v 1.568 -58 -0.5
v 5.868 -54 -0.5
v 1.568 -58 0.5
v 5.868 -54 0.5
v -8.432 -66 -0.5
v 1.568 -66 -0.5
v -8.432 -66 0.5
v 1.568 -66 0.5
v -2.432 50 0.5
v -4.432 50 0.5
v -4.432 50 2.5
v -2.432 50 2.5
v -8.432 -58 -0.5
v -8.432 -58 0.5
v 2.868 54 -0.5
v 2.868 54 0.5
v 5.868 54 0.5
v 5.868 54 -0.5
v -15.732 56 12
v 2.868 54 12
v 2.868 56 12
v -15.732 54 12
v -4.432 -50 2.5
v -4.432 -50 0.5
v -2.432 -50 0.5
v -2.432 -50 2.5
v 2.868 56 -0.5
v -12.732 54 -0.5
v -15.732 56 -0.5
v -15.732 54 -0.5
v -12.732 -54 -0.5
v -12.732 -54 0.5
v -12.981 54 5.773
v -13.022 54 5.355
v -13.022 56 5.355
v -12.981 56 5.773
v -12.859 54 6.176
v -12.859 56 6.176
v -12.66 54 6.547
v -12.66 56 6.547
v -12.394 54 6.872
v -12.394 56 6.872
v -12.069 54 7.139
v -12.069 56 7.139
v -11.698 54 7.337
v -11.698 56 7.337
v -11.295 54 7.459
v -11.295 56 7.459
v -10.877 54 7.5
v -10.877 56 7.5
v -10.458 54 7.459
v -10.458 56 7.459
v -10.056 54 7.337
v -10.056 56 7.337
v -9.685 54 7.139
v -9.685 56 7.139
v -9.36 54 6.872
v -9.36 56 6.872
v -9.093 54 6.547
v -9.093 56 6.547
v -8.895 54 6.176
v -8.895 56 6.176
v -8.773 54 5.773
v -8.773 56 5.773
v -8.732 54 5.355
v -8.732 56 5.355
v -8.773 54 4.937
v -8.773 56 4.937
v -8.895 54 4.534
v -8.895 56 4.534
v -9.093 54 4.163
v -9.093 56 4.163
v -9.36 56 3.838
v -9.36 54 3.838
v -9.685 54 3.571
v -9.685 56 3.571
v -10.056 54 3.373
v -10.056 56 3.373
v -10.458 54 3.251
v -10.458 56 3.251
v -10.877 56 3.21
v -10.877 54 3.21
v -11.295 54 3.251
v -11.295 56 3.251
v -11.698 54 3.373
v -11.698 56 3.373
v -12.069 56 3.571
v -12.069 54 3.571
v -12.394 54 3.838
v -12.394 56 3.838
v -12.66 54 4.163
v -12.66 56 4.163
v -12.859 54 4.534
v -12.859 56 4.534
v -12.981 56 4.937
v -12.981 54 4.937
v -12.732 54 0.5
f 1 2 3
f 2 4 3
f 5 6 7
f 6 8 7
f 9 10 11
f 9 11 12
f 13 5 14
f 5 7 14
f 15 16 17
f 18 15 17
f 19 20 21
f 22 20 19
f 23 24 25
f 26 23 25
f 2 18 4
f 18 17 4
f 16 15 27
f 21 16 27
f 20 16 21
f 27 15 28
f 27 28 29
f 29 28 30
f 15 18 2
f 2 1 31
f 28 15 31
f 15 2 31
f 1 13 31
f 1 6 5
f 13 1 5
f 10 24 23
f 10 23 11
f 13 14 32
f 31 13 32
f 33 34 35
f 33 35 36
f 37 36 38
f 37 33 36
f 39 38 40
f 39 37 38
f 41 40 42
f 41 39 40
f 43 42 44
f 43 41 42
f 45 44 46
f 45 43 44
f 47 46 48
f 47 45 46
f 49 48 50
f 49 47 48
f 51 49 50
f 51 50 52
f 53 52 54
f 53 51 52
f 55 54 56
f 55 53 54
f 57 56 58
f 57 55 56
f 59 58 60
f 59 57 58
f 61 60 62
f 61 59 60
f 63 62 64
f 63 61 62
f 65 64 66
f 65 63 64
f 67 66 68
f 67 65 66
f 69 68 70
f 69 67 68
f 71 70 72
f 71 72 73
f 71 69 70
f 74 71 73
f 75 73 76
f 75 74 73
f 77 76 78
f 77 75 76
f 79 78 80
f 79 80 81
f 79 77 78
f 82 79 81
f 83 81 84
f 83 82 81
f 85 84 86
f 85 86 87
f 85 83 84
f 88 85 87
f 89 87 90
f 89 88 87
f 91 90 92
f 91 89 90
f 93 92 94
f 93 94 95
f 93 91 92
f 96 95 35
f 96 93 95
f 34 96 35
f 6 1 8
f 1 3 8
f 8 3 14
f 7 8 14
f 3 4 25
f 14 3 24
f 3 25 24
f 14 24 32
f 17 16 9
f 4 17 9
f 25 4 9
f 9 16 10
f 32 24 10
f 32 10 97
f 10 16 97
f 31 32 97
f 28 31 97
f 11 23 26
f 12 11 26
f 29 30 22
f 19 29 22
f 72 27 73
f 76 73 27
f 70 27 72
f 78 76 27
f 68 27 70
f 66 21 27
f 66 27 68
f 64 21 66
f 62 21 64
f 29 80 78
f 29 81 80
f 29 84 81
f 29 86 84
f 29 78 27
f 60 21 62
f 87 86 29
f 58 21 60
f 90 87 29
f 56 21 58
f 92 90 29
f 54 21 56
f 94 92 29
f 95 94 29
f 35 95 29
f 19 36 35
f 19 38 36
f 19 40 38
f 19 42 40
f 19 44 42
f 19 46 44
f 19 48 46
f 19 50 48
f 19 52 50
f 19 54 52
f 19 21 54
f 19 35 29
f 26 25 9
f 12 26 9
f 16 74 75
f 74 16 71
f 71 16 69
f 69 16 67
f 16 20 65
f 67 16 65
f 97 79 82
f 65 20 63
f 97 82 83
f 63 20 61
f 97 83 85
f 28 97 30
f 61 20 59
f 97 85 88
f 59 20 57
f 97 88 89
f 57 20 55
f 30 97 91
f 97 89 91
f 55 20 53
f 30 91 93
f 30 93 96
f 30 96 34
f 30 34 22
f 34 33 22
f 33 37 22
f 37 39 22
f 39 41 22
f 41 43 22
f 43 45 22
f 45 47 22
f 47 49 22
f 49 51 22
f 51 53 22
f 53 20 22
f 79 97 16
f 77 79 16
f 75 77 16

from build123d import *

# Parameters (mm, degrees)
PAD_DEPTH    = 0.5
SKETCH001_W  = 2
SKETCH001_H  = 100
PAD001_DEPTH = 2
SKETCH002_W  = 18.6
SKETCH002_H  = 12.5
SKETCH002_R  = 2.145
PAD002_DEPTH = 2


with BuildPart() as part:
    # Sketch → Pad (new body, symmetric)
    with BuildSketch(Plane.XY):
        Polygon((-12.731854, 54), (5.868146, 54), (5.868146, -53.999996), (1.568146, -57.999992), (1.568146, -66), (-8.431854, -66), (-8.431854, -57.999992), (-12.731854, -53.999996), align=None)
    extrude(amount=PAD_DEPTH, both=True)

    # Sketch001 (on Face10 of Pad) → Pad001 (join)
    with BuildSketch(Plane.XY.offset(0.5)):
        with Locations((-3.431854, 0)):
            Rectangle(SKETCH001_W, SKETCH001_H)
    extrude(amount=PAD001_DEPTH)

    # Sketch002 (on Face1 of Pad001) → Pad002 (join)
    with BuildSketch(Plane(origin=(0, 54, 0), x_dir=(-1, 0, 0), z_dir=(0, 1, 0))):
        with Locations((6.431854, 5.75)):
            Rectangle(SKETCH002_W, SKETCH002_H)
        with Locations((10.876855, 5.355)):
            Circle(SKETCH002_R, mode=Mode.SUBTRACT)
    extrude(amount=PAD002_DEPTH)


solid = part.part
